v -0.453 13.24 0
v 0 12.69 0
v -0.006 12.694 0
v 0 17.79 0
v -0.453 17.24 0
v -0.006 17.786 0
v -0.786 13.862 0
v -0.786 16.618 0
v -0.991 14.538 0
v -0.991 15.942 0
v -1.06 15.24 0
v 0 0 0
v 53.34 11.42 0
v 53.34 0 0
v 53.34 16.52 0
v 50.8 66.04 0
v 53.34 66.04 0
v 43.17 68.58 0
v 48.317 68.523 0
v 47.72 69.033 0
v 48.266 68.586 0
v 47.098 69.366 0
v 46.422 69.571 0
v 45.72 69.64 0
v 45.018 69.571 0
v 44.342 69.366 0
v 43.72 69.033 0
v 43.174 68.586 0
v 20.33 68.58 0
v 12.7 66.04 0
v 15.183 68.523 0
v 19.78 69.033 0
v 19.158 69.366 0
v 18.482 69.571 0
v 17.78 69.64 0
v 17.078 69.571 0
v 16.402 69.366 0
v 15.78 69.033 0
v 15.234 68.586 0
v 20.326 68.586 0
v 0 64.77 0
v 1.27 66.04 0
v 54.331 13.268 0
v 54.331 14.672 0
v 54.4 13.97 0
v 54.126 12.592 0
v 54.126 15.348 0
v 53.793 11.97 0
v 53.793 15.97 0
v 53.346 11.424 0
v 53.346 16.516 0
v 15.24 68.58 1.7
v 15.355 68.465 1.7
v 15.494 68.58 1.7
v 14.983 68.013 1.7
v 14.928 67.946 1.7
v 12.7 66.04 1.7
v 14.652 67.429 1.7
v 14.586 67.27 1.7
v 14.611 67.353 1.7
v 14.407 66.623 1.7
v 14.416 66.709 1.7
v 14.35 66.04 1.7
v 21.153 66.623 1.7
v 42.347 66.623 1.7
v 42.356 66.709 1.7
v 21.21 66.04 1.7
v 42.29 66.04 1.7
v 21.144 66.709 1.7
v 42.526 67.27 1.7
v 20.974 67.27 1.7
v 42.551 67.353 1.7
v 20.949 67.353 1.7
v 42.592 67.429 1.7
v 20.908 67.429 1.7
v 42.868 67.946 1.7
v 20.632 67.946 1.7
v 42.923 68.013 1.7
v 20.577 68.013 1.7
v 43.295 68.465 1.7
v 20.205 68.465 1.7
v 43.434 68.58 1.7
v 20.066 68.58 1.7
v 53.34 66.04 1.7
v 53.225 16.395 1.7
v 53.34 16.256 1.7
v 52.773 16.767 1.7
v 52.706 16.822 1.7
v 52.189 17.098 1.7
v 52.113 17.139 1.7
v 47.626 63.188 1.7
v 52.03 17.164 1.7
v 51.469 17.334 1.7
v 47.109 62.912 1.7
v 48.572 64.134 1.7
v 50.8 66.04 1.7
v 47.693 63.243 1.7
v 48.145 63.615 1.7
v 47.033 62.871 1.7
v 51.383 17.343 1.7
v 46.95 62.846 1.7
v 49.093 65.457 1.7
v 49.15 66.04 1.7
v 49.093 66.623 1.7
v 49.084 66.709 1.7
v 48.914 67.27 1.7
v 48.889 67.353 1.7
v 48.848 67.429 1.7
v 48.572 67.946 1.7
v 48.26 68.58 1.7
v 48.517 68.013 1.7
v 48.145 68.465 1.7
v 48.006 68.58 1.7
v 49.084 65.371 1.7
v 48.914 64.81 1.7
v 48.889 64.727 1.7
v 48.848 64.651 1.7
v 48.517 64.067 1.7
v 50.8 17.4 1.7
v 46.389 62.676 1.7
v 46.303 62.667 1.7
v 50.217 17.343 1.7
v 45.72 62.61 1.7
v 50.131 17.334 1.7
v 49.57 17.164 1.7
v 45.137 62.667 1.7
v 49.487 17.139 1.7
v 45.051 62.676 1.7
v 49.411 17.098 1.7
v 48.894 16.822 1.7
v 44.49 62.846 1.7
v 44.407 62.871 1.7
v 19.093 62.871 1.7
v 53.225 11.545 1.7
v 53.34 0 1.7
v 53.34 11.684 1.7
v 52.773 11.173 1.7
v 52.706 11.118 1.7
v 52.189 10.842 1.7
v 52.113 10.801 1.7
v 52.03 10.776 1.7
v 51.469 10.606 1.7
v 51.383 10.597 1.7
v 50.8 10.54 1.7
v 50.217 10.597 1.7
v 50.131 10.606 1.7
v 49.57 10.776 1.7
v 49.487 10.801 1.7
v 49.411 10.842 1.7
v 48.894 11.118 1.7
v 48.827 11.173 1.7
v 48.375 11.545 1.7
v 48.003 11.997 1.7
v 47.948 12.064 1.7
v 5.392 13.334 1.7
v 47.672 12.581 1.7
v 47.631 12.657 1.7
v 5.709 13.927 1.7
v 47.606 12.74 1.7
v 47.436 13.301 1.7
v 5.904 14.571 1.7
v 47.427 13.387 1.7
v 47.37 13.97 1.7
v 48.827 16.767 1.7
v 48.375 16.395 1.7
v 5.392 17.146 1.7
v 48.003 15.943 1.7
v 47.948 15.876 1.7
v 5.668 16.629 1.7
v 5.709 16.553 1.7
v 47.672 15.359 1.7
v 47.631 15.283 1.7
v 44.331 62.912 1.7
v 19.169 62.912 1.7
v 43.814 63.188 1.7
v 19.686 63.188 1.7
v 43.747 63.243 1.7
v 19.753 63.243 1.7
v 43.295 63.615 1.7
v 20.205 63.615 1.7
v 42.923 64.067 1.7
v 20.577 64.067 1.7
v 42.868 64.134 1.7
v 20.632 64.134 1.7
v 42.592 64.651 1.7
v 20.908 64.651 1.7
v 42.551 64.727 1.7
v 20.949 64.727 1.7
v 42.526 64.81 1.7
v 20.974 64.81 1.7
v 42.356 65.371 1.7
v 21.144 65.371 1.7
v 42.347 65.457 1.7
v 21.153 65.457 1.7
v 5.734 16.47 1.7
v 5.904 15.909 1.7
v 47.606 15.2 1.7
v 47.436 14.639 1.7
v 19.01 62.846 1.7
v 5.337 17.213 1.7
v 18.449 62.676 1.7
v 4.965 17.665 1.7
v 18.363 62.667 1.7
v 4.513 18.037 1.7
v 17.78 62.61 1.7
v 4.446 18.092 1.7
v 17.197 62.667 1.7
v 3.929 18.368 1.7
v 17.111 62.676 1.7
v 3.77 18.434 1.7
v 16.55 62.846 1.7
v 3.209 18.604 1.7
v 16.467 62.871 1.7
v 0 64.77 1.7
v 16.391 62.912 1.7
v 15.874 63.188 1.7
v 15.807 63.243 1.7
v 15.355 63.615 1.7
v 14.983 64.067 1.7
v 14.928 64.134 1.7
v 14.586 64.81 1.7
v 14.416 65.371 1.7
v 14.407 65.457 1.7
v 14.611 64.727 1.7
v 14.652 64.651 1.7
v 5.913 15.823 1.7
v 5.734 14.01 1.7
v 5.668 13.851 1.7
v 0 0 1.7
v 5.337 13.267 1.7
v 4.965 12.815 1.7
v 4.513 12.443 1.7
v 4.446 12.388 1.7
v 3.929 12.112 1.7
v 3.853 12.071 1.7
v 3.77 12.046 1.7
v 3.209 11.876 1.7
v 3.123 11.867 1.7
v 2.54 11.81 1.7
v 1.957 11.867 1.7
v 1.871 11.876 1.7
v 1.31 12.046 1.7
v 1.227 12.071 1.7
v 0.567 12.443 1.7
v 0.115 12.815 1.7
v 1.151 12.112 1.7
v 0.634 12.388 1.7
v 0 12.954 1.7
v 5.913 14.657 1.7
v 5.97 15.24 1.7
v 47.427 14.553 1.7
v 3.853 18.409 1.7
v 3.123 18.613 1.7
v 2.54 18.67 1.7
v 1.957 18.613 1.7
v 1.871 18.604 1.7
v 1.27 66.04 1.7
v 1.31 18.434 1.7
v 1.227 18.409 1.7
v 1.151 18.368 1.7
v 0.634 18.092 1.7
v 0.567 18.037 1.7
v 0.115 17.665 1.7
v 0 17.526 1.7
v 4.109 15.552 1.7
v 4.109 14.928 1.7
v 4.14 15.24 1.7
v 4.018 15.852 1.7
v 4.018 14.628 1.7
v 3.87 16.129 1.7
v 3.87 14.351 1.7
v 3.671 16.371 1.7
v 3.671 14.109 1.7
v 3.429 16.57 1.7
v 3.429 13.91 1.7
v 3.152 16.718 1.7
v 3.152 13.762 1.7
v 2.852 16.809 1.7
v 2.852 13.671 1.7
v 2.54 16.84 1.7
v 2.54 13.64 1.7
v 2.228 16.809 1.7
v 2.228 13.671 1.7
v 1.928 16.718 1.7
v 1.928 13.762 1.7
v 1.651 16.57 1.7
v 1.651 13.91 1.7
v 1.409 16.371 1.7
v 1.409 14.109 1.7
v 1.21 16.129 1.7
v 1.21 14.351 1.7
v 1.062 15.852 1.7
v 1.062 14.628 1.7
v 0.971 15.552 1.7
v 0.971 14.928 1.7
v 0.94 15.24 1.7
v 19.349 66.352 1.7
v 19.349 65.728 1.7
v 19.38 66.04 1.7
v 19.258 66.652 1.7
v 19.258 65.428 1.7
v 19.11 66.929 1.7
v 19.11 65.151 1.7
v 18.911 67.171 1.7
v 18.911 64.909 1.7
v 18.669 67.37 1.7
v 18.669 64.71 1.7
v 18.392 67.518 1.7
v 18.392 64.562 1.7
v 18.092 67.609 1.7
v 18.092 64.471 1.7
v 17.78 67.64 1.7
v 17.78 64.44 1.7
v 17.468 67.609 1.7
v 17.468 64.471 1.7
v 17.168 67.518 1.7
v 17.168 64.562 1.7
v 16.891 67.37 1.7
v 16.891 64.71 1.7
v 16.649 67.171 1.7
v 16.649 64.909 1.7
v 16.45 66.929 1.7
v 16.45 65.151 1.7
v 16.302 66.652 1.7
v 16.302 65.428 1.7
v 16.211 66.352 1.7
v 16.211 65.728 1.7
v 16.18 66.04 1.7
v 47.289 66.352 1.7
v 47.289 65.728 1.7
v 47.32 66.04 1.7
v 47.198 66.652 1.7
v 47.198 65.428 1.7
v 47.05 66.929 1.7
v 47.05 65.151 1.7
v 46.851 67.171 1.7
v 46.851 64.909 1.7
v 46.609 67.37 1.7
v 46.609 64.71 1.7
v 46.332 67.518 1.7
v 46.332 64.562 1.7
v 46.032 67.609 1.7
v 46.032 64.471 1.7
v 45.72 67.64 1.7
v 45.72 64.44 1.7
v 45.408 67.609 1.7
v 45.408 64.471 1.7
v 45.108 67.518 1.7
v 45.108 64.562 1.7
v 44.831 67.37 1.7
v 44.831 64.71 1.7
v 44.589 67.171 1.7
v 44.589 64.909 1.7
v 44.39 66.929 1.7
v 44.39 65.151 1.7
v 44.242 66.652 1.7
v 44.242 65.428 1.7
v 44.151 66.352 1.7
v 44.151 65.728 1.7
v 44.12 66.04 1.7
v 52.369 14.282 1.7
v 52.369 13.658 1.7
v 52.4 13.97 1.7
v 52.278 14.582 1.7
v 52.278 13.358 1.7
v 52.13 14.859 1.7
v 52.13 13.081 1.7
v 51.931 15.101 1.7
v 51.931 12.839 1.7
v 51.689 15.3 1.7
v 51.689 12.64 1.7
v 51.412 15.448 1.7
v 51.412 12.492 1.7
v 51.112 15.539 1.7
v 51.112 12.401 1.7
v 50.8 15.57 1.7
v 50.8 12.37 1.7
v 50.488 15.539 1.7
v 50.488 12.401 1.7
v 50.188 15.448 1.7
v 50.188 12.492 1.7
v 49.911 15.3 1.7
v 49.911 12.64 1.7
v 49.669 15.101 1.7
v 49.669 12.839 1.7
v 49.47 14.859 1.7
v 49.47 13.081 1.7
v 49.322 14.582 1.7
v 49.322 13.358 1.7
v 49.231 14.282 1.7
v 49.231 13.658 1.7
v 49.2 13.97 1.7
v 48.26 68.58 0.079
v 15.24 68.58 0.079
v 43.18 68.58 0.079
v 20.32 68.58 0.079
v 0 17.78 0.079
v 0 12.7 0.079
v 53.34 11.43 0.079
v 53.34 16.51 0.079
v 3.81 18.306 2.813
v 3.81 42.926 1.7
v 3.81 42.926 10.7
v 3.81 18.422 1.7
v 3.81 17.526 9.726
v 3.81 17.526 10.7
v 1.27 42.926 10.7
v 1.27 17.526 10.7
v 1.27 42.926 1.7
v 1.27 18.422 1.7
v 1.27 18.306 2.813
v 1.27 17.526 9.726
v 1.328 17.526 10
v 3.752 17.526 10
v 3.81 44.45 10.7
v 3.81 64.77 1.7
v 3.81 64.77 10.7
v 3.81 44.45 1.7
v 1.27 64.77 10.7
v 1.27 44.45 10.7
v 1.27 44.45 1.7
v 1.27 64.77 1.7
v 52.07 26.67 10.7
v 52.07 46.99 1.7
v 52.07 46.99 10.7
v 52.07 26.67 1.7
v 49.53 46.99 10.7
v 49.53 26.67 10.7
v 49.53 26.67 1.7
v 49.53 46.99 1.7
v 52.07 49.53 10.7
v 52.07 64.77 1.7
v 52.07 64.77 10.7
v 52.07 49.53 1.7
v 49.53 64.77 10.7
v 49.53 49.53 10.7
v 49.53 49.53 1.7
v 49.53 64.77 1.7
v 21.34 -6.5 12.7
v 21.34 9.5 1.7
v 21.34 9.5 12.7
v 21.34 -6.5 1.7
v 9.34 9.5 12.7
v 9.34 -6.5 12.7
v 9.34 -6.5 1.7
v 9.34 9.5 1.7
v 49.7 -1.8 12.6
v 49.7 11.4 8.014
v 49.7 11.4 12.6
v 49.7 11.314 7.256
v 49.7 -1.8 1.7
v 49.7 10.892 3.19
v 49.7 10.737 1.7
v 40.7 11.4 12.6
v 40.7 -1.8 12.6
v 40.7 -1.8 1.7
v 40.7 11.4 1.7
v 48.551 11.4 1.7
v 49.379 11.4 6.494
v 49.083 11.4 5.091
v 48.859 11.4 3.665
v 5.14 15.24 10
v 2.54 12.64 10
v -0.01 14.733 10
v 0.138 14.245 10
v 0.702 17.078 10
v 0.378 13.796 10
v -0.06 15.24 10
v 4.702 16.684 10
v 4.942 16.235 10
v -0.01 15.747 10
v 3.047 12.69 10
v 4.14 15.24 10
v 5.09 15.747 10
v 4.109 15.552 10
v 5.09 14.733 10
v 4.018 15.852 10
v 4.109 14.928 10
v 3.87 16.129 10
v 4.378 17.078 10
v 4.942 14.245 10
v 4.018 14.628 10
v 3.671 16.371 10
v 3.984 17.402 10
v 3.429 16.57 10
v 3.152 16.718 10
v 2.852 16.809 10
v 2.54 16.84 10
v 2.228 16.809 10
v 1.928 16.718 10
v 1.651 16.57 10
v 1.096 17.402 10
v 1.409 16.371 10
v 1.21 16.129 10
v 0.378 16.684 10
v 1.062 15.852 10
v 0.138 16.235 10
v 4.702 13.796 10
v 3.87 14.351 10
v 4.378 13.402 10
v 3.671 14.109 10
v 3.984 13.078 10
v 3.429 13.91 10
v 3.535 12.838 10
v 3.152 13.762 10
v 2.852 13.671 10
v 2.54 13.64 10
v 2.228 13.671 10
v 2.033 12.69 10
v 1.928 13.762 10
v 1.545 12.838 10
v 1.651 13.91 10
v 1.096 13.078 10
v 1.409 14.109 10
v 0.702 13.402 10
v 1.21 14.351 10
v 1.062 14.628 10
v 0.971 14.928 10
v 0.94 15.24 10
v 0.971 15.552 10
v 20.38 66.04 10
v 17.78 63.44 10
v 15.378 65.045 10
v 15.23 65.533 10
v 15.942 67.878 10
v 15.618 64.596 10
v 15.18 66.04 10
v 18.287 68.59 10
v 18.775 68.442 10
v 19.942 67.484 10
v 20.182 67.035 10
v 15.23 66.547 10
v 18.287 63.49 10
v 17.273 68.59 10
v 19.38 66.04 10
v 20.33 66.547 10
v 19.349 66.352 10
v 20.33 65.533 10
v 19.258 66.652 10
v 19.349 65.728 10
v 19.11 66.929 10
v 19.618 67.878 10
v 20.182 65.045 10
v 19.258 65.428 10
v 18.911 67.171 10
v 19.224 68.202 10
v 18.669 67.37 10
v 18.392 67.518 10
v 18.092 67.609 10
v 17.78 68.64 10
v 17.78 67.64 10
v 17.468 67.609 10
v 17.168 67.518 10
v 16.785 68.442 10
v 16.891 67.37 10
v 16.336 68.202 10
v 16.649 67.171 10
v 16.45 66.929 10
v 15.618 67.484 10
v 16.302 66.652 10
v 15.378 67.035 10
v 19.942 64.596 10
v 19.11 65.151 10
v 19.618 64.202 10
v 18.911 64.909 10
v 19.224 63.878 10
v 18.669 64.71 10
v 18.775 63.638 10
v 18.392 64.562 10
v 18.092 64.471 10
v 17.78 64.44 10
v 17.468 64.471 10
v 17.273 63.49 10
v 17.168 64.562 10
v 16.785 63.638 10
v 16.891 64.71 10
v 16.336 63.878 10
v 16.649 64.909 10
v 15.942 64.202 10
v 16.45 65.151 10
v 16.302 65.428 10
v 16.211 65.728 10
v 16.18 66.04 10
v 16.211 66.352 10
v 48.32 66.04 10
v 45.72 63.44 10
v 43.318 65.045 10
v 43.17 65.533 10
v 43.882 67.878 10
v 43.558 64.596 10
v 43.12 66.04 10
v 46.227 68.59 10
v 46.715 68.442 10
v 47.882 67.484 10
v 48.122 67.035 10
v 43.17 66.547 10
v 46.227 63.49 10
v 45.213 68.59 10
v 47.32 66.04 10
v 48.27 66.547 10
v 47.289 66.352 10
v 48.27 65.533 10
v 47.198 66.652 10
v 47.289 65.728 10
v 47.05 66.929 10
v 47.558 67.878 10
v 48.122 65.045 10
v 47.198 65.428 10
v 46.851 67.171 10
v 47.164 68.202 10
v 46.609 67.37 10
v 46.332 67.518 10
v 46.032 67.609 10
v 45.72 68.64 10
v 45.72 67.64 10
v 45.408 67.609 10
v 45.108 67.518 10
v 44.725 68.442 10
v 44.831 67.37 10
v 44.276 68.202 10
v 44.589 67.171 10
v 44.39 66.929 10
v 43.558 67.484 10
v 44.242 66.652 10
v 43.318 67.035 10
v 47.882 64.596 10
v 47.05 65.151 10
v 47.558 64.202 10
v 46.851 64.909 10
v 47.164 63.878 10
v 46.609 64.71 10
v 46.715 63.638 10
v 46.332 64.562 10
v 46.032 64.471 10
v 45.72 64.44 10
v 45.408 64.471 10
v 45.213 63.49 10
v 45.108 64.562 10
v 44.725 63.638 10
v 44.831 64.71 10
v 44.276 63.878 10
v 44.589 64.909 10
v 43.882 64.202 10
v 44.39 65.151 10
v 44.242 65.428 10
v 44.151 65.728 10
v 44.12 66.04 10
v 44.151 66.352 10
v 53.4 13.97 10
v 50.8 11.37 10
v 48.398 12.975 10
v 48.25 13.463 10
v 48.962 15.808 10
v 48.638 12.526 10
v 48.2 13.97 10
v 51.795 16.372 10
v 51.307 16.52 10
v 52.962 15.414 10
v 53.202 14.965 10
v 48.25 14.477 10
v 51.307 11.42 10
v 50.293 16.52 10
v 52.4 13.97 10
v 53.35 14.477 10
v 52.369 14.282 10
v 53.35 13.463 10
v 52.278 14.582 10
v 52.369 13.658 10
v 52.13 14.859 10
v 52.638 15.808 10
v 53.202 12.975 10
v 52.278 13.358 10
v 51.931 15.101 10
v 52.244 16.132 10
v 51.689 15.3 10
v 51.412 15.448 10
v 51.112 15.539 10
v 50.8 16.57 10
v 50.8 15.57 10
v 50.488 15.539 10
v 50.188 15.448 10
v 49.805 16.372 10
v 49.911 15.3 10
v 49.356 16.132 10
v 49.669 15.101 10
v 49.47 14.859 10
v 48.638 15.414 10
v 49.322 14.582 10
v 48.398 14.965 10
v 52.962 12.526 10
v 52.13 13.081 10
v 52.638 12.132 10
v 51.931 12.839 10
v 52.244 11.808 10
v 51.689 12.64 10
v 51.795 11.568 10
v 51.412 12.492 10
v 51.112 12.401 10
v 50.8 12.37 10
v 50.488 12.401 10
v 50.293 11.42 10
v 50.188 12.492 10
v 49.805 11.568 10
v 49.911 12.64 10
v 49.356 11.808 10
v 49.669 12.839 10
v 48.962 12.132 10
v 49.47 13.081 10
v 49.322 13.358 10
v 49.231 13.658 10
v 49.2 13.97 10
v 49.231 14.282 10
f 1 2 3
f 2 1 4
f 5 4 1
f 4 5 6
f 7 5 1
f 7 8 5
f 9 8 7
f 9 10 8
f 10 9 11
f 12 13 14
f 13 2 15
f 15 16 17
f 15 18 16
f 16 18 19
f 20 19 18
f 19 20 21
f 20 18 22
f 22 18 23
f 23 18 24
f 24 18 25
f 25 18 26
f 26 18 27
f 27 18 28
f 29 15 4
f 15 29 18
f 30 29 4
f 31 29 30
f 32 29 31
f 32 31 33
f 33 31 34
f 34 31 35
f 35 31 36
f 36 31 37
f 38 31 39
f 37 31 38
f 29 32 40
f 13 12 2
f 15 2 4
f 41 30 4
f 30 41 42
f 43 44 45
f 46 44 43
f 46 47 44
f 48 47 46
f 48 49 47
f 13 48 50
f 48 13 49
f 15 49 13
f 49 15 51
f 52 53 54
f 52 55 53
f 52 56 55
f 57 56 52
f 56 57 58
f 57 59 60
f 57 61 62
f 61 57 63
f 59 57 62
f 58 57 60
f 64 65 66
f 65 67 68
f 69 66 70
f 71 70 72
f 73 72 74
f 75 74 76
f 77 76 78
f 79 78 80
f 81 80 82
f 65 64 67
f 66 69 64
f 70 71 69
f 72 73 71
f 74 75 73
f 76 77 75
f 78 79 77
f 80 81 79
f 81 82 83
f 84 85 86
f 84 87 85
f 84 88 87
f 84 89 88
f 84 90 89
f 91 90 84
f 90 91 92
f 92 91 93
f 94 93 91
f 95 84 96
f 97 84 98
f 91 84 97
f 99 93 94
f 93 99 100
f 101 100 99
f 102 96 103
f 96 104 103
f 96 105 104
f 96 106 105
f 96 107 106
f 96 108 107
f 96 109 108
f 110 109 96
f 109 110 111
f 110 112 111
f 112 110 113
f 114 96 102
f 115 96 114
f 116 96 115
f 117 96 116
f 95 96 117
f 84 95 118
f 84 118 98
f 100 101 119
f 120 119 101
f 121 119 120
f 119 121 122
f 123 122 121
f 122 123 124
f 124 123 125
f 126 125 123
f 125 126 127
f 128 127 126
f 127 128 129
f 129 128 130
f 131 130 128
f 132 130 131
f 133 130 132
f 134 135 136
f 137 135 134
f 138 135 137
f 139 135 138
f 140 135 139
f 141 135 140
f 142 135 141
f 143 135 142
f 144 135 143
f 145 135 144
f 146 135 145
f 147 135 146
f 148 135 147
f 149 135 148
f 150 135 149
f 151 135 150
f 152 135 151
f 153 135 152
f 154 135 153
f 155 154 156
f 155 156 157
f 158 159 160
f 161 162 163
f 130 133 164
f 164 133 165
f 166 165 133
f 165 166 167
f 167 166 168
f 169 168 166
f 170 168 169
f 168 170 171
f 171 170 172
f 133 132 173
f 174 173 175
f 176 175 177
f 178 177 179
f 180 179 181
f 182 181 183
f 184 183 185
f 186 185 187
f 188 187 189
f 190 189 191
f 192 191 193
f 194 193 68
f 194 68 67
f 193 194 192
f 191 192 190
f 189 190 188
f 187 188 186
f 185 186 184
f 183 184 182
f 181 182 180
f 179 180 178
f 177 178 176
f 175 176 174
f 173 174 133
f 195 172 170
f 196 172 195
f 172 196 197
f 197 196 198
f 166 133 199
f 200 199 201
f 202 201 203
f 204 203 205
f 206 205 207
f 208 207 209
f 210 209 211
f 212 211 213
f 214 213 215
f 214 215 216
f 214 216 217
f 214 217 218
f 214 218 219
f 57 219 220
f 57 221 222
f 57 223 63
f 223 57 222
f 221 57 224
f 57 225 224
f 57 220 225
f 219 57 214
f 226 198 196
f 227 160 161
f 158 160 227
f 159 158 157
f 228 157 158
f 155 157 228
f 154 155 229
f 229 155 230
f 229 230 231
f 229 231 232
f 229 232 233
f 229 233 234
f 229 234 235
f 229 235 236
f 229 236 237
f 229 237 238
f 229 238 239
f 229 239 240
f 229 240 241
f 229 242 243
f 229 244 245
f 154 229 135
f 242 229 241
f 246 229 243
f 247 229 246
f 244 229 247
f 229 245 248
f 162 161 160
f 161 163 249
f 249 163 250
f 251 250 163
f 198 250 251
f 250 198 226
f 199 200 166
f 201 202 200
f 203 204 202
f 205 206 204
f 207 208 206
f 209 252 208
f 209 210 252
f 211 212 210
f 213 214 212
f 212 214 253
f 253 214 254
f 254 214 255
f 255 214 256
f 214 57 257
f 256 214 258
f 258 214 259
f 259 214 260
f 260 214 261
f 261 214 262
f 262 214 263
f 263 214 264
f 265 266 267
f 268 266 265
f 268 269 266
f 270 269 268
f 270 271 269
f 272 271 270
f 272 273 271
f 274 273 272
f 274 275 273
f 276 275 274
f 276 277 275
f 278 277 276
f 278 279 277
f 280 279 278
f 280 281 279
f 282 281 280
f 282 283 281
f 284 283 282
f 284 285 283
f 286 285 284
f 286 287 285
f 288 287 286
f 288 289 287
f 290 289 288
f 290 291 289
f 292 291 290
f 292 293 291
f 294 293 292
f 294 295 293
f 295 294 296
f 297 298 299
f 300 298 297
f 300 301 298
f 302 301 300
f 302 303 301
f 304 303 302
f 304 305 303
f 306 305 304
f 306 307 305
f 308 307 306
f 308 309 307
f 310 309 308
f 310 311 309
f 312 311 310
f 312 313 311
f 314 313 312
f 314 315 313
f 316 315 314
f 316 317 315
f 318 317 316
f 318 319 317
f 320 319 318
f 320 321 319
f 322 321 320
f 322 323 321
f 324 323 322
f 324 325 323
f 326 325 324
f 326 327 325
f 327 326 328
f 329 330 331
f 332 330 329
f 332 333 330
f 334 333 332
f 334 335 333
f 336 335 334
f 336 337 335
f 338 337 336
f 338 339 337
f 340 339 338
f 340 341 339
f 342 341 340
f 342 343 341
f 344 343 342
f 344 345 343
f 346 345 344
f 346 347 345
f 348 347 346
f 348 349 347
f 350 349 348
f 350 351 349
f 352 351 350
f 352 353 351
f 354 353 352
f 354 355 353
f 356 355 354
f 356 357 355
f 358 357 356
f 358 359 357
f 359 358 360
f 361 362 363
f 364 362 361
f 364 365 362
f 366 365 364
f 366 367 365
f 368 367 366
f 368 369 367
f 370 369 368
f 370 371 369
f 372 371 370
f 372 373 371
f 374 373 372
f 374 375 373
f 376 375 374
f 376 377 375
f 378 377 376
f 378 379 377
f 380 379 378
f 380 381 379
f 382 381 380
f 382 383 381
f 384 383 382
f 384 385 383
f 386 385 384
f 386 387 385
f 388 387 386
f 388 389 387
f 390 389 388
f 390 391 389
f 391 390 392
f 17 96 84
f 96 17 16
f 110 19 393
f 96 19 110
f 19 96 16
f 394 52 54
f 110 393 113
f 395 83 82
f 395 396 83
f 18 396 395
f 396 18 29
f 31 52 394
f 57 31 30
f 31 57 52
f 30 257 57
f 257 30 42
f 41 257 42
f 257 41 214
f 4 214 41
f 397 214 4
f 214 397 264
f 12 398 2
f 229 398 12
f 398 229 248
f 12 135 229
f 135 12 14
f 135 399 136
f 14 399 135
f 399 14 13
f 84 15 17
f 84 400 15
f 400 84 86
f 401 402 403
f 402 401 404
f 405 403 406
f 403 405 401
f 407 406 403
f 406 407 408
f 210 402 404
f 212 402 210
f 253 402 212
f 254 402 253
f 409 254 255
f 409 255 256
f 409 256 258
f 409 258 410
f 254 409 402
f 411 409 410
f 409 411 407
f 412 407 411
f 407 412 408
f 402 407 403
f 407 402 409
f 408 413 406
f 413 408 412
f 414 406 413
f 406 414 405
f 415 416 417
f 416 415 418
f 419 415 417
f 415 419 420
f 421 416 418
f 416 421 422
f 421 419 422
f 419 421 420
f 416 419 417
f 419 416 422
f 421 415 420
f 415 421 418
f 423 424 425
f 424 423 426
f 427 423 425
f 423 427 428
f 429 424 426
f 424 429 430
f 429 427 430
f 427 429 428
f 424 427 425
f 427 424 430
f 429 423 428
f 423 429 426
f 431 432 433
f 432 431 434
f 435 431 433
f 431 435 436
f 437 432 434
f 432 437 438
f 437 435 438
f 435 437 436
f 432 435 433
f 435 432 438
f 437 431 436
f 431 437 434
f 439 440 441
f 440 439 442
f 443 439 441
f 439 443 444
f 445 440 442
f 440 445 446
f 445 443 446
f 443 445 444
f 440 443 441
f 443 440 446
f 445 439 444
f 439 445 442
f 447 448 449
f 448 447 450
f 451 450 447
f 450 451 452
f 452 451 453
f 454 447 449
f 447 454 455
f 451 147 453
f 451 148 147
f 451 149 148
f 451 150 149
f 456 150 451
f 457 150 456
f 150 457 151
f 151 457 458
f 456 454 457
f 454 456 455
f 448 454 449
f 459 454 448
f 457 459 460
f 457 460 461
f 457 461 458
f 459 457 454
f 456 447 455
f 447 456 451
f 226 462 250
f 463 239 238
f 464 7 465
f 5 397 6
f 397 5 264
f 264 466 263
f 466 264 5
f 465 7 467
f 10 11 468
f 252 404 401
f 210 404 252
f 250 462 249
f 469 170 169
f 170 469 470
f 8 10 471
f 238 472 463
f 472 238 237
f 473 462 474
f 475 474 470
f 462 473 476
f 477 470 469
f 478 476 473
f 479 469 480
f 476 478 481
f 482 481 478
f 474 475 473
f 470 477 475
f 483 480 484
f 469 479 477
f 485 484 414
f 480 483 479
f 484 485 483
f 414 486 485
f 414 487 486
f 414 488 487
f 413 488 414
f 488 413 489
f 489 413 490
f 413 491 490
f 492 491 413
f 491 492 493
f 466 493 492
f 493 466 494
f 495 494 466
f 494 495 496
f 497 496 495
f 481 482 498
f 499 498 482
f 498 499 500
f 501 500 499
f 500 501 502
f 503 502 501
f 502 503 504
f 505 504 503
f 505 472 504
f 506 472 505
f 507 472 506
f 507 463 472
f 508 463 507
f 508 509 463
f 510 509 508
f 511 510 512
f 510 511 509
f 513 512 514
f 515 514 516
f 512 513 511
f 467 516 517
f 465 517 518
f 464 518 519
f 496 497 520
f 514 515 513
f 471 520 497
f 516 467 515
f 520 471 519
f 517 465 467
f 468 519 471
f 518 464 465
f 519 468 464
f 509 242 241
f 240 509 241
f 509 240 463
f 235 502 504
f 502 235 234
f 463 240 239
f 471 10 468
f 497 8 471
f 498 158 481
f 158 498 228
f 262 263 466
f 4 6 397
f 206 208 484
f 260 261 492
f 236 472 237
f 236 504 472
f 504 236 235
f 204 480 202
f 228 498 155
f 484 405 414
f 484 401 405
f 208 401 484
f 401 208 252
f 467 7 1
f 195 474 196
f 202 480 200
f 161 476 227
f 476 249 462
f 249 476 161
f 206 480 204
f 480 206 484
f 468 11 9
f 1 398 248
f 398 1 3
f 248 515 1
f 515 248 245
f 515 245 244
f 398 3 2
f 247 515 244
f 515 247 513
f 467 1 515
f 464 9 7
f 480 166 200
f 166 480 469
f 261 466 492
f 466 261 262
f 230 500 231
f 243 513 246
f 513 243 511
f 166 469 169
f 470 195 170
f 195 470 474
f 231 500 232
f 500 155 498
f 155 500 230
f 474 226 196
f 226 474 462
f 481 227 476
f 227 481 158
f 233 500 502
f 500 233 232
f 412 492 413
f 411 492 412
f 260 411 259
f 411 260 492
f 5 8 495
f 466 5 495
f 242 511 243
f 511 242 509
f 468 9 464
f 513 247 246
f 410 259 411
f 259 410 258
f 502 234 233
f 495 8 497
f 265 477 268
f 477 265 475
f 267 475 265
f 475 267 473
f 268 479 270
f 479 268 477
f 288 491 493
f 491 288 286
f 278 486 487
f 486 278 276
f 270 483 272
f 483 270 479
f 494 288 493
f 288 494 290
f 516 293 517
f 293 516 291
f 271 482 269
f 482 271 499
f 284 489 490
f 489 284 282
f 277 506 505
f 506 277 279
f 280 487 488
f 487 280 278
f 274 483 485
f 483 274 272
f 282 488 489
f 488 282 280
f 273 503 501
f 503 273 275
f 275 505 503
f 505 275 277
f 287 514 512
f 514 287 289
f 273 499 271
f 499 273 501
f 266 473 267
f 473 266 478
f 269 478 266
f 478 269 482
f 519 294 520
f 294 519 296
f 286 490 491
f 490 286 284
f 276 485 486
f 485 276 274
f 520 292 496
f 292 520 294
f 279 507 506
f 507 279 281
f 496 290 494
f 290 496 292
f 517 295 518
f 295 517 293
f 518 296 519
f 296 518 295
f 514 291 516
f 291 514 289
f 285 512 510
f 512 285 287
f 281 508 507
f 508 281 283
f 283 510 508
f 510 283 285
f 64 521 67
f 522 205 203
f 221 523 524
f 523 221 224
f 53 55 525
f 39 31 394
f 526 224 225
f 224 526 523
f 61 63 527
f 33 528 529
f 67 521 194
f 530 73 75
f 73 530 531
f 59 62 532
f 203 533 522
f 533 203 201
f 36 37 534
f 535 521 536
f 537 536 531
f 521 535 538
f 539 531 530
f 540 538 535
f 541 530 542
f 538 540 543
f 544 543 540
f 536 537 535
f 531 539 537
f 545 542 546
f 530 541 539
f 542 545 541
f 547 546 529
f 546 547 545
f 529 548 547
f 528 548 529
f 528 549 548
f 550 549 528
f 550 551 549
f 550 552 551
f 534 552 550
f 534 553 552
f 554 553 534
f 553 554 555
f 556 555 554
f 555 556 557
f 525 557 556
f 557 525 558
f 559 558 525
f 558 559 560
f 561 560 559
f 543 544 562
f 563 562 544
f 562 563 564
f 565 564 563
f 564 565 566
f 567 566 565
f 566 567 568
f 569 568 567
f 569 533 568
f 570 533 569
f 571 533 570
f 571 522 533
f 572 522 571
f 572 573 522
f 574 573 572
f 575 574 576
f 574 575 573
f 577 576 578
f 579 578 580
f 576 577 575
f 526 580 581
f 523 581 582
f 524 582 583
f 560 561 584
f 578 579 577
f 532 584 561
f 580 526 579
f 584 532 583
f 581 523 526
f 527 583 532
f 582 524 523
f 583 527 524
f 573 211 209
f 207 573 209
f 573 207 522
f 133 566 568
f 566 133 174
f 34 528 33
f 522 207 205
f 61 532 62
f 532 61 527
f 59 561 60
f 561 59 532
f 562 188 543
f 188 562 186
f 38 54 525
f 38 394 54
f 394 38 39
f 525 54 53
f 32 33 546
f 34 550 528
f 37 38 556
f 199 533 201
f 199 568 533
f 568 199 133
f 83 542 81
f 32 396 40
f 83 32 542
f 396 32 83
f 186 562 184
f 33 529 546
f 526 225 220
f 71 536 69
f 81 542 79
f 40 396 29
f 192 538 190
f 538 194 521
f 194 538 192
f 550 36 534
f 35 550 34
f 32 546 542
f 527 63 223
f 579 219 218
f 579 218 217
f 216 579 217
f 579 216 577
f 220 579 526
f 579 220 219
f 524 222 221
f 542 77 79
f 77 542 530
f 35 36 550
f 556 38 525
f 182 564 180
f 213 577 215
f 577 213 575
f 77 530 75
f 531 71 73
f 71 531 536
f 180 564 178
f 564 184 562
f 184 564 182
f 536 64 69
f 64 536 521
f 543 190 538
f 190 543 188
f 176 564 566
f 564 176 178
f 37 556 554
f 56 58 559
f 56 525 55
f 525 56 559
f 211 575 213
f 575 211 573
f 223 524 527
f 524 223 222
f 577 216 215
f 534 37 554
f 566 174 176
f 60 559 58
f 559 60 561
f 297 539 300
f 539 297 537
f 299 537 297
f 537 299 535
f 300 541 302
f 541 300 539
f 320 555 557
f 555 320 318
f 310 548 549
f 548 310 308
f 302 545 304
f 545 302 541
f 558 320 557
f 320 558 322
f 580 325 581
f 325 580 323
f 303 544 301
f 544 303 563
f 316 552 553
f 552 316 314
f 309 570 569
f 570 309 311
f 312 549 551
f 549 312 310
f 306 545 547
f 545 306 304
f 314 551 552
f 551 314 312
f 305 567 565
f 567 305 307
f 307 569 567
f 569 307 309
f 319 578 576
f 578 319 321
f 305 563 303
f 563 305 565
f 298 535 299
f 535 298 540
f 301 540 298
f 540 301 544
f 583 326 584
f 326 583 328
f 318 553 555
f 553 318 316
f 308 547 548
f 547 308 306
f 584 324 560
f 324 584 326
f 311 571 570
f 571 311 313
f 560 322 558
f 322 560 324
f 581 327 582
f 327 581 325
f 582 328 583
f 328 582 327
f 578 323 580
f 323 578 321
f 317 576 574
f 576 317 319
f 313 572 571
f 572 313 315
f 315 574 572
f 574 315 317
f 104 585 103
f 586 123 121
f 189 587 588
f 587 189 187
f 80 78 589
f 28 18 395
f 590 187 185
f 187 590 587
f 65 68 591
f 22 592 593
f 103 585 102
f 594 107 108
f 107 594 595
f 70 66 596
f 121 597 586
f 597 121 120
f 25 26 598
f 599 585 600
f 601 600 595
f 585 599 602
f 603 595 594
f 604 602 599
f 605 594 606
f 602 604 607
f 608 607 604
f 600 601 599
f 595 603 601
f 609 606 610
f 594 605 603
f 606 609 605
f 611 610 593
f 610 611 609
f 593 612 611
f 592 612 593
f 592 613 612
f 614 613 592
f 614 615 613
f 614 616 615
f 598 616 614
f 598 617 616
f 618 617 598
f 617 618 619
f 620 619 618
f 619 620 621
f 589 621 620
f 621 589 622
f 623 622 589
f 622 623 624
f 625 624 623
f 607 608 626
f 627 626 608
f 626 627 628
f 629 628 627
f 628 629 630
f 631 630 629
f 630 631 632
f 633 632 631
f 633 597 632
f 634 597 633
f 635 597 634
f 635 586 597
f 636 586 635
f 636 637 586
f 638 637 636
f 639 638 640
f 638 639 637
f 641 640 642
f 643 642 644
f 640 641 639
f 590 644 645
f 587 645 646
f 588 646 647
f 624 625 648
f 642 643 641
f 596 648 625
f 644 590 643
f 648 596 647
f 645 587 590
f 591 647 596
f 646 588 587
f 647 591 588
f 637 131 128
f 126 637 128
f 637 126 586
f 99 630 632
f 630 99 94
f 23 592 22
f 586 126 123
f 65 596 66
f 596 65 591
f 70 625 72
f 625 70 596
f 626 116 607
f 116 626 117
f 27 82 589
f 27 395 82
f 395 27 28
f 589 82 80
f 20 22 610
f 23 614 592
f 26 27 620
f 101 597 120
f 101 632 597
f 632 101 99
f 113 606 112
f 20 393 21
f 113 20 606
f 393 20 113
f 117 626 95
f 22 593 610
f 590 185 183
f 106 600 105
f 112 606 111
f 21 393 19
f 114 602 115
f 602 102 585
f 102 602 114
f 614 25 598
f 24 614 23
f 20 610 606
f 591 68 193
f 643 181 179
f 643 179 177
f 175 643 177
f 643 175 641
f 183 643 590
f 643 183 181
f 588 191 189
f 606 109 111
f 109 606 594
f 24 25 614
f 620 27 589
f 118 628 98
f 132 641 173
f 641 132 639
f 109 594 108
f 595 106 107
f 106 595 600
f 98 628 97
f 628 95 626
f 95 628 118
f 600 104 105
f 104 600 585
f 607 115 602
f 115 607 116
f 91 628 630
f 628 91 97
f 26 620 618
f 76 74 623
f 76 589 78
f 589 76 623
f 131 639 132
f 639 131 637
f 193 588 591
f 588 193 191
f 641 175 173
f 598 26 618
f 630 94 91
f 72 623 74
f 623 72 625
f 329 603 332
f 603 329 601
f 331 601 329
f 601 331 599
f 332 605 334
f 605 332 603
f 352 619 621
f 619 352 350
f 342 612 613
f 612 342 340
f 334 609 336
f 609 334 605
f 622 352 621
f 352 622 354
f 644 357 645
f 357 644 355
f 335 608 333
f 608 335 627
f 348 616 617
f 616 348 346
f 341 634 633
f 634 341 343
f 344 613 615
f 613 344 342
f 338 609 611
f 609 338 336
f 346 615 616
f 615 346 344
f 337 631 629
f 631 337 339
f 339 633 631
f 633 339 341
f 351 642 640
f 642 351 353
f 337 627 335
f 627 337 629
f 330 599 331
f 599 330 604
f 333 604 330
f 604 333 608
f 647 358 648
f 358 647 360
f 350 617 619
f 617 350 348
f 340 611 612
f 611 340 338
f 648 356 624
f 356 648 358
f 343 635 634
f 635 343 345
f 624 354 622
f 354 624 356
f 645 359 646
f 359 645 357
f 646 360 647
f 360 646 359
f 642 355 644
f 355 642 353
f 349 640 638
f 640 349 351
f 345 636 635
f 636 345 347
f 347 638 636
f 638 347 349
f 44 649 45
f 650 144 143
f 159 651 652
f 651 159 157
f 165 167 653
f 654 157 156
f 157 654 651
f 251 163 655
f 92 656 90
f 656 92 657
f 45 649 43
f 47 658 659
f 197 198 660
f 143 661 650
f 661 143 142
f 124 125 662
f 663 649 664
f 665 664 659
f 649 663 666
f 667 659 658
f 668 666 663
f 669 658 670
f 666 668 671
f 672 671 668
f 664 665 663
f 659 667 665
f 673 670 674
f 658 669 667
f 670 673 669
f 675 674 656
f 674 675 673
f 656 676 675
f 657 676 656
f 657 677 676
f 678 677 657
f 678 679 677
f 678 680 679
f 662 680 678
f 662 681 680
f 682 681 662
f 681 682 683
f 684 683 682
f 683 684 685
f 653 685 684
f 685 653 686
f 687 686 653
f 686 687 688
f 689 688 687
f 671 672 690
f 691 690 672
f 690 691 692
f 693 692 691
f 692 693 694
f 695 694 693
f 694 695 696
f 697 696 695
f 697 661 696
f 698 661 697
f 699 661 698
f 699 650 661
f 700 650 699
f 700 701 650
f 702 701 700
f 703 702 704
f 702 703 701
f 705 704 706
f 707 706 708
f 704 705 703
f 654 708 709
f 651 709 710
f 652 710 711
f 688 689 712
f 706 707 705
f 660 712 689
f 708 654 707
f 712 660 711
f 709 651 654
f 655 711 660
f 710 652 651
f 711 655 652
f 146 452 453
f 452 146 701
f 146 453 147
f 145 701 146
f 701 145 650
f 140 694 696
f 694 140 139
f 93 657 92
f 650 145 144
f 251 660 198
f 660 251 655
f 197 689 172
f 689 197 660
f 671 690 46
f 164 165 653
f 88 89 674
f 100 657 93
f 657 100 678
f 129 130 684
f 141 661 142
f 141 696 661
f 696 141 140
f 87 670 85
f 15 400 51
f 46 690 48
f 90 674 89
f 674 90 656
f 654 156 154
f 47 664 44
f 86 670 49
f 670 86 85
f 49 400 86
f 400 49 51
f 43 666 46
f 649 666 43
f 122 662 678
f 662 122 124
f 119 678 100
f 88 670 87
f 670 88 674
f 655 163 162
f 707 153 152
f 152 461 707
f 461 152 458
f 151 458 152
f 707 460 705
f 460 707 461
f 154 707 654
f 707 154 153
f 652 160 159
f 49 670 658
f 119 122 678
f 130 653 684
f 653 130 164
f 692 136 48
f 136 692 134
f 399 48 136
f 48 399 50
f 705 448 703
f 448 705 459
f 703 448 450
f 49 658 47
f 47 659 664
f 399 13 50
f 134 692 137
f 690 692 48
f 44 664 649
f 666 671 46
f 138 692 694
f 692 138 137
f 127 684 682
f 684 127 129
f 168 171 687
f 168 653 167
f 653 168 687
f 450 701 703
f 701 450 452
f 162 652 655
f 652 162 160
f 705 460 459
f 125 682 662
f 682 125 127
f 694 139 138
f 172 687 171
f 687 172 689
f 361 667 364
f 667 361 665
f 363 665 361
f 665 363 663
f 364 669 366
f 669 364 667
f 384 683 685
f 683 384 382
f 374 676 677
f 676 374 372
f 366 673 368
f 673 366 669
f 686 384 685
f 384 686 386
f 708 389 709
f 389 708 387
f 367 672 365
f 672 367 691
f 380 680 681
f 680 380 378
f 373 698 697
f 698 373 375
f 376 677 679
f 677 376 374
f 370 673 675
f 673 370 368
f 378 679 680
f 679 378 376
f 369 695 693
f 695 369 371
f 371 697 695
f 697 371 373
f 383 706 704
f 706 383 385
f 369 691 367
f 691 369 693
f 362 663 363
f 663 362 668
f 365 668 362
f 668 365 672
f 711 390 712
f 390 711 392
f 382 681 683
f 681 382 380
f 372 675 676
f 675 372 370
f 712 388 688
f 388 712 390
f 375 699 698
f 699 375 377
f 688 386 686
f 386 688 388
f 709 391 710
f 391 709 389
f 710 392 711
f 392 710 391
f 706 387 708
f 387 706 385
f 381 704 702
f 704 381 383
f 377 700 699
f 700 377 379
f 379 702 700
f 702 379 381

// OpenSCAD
// Arduino connectors library
//
// Copyright (c) 2013 Kelly Egan
//
// The MIT License (MIT)
//
// Permission is hereby granted, free of charge, to any person obtaining a copy of this software 
// and associated documentation files (the "Software"), to deal in the Software without restriction, 
// including without limitation the rights to use, copy, modify, merge, publish, distribute, sublicense,
// and/or sell copies of the Software, and to permit persons to whom the Software is furnished to do 
// so, subject to the following conditions:
//
// The above copyright notice and this permission notice shall be included in all copies or substantial
// portions of the Software.
//
// THE SOFTWARE IS PROVIDED "AS IS", WITHOUT WARRANTY OF ANY KIND, EXPRESS OR IMPLIED, INCLUDING BUT 
// NOT LIMITED TO THE WARRANTIES OF MERCHANTABILITY, FITNESS FOR A PARTICULAR PURPOSE AND NONINFRINGEMENT. 
// IN NO EVENT SHALL THE AUTHORS OR COPYRIGHT HOLDERS BE LIABLE FOR ANY CLAIM, DAMAGES OR OTHER LIABILITY,
// WHETHER IN AN ACTION OF CONTRACT, TORT OR OTHERWISE, ARISING FROM, OUT OF OR IN CONNECTION WITH THE 
// SOFTWARE OR THE USE OR OTHER DEALINGS IN THE SOFTWARE.
//

//use <pin_connectors/pins.scad>

//Constructs a roughed out arduino board
//Current only USB, power and headers
module arduino(boardType = UNO) {
  //The PCB with holes
  difference() {
    color("SteelBlue") 
      boardShape( boardType );
    translate([0,0,-pcbHeight * 0.5]) holePlacement(boardType = boardType)
      color("SteelBlue") cylinder(r = mountingHoleRadius, h = pcbHeight * 2, $fn=32);
  }
  //Add all components to board
  components( boardType = boardType, component = ALL );
}
arduino();
//Creates a bumper style enclosure that fits tightly around the edge of the PCB.
module bumper( boardType = UNO, mountingHoles = false ) {
  bumperBaseHeight = 2;
  bumperHeight = bumperBaseHeight + pcbHeight + 0.5;
  dimensions = boardDimensions(boardType);

  difference() {
    union() {
      //Outer rim of bumper
      difference() {
        boardShape(boardType = boardType, offset=1.4, height = bumperHeight);
        translate([0,0,-0.1])
          boardShape(boardType = boardType, height = bumperHeight + 0.2);
      }

      //Base of bumper  
      difference() {
        boardShape(boardType = boardType, offset=1, height = bumperBaseHeight);
        translate([0,0, -0.1])
          boardShape(boardType = boardType, offset=-2, height = bumperHeight + 0.2);
      }

      //Board mounting holes
      holePlacement(boardType=boardType)
        cylinder(r = mountingHoleRadius + 1.5, h = bumperBaseHeight, $fn = 32);

      //Bumper mounting holes (exterior)
      if( mountingHoles ) {
        difference() {  
          hull() {
            translate([-6, (dimensions[1] - 6) / 2, 0])
              cylinder( r = 6, h = pcbHeight + 2, $fn = 32 );
            translate([ -0.5, dimensions[1] / 2 - 9, 0])
              cube([0.5, 12, bumperHeight]);
          }
          translate([-6, (dimensions[1] - 6) / 2, 0])
            mountingHole(holeDepth = bumperHeight);
        }
        difference() {  
          hull() {
            translate([dimensions[0] + 6, (dimensions[1] - 6) / 2,0])
              cylinder( r = 6, h = pcbHeight + 2, $fn = 32 );
            translate([ dimensions[0], dimensions[1] / 2 - 9, 0]) 
              cube([0.5, 12, bumperHeight]);
          }
          translate([dimensions[0] + 6, (dimensions[1] - 6) / 2,0])
            mountingHole(holeDepth = bumperHeight);
        }
      }
    }
    translate([0,0,-0.5])
    holePlacement(boardType=boardType)
      cylinder(r = mountingHoleRadius, h = bumperHeight, $fn = 32);  
    translate([0, 0, bumperBaseHeight]) {
      components(boardType = boardType, component = ALL, offset = 1);
    }
    translate([4,(dimensions[1] - dimensions[1] * 0.4)/2,-1])
      cube([dimensions[0] -8,dimensions[1] * 0.4,bumperBaseHeight + 2]);
  }
}

//Setting for enclosure mounting holes (Not Arduino mounting)
NOMOUNTINGHOLES = 0;
INTERIORMOUNTINGHOLES = 1;
EXTERIORMOUNTINGHOLES = 2;

//Create a board enclosure
module enclosure(boardType = UNO, wall = 3, offset = 3, heightExtension = 10, cornerRadius = 3, mountType = TAPHOLE) {
  standOffHeight = 5;

  dimensions = boardDimensions(boardType);
  boardDim = boardDimensions(boardType);
  pcbDim = pcbDimensions(boardType);

  enclosureWidth = pcbDim[0] + (wall + offset) * 2;
  enclosureDepth = pcbDim[1] + (wall + offset) * 2;
  enclosureHeight = boardDim[2] + wall + standOffHeight + heightExtension;

  union() {
    difference() {
      //Main box shape
      boundingBox(boardType = boardType, height = enclosureHeight, offset = wall + offset, include=PCB, cornerRadius = wall);
  
      translate([ 0, 0, wall]) {
        //Interior of box
        boundingBox(boardType = boardType, height = enclosureHeight, offset = offset, include=PCB, cornerRadius = wall);
  
        //Punch outs for USB and POWER
        translate([0, 0, standOffHeight]) {
          components(boardType = boardType, offset = 1, extension = wall + offset + 10);
        }
      }
      
      //Holes for lid clips
      translate([0, enclosureDepth * 0.75 - (offset + wall), enclosureHeight]) {
        translate([-offset, 0, 0])
          rotate([0, 180, 90]) clipHole(clipHeight = 10, holeDepth = wall + 0.2);
        translate([offset + boardDim[0], 0, 0])
          rotate([0, 180, 270]) clipHole(clipHeight = 10, holeDepth = wall + 0.2);
      }
    
      translate([0, enclosureDepth * 0.25 - (offset + wall), enclosureHeight]) {
        translate([-offset, 0, 0])
          rotate([0, 180, 90]) clipHole(clipHeight = 10, holeDepth = wall + 0.2);
        translate([offset + dimensions[0], 0, 0])
          rotate([0, 180, 270]) clipHole(clipHeight = 10, holeDepth = wall + 0.2);
      }   
    }
    translate([0, 0, wall]) {
      standoffs(boardType = boardType, height = standOffHeight, mountType = mountType);
    }
  }
}

//Create a snap on lid for enclosure
module enclosureLid( boardType = UNO, wall = 3, offset = 3, cornerRadius = 3, ventHoles = false) {
  dimensions = boardDimensions(boardType);
  boardDim = boardDimensions(boardType);
  pcbDim = pcbDimensions(boardType);

  enclosureWidth = pcbDim[0] + (wall + offset) * 2;
  enclosureDepth = pcbDim[1] + (wall + offset) * 2;

  difference() {
    union() {
      boundingBox(boardType = boardType, height = wall, offset = wall + offset, include=PCB, cornerRadius = wall);

      translate([0, 0, -wall * 0.5])
        boundingBox(boardType = boardType, height = wall * 0.5, offset = offset - 0.5, include=PCB, cornerRadius = wall);
    
      //Lid clips
      translate([0, enclosureDepth * 0.75 - (offset + wall), 0]) {
        translate([-offset, 0, 0])
          rotate([0, 180, 90]) clip(clipHeight = 10);
        translate([offset + boardDim[0], 0, 0])
          rotate([0, 180, 270]) clip(clipHeight = 10);
      }
    
      translate([0, enclosureDepth * 0.25 - (offset + wall), 0]) {
        translate([-offset, 0, 0])
          rotate([0, 180, 90]) clip(clipHeight = 10);
        translate([offset + dimensions[0], 0, 0])
          rotate([0, 180, 270]) clip(clipHeight = 10);
      }

    }
  }
}

//Offset from board. Negative values are insets
module boardShape( boardType = UNO, offset = 0, height = pcbHeight ) {
  dimensions = boardDimensions(boardType);

  xScale = (dimensions[0] + offset * 2) / dimensions[0];
  yScale = (dimensions[1] + offset * 2) / dimensions[1];

  translate([-offset, -offset, 0])
    scale([xScale, yScale, 1.0])
      linear_extrude(height = height) 
        polygon(points = boardShapes[boardType]);
}
boardShape();

//Create a bounding box around the board
//Offset - will increase the size of the box on each side,
//Height - overides the boardHeight and offset in the z direction

BOARD = 0;        //Includes all components and PCB
PCB = 1;          //Just the PCB
COMPONENTS = 2;   //Just the components

module boundingBox(boardType = UNO, offset = 0, height = 0, cornerRadius = 0, include = BOARD) {
  //What parts are included? Entire board, pcb or just components.
  pos = ([boardPosition(boardType), pcbPosition(boardType), componentsPosition(boardType)])[include];
  dim = ([boardDimensions(boardType), pcbDimensions(boardType), componentsDimensions(boardType)])[include];

  //Depending on if height is set position and dimensions will change
  position = [
        pos[0] - offset, 
        pos[1] - offset, 
        (height == 0 ? pos[2] - offset : pos[2] )
        ];

  dimensions = [
        dim[0] + offset * 2, 
        dim[1] + offset * 2, 
        (height == 0 ? dim[2] + offset * 2 : height)
        ];

  translate( position ) {
    if( cornerRadius == 0 ) {
      cube( dimensions );
    } else {
      roundedCube( dimensions, cornerRadius=cornerRadius );
    }
  }
}

//Creates standoffs for different boards
TAPHOLE = 0;
PIN = 1;

module standoffs( 
  boardType = UNO, 
  height = 10, 
  topRadius = mountingHoleRadius + 1, 
  bottomRadius =  mountingHoleRadius + 2, 
  holeRadius = mountingHoleRadius,
  mountType = TAPHOLE
  ) {

  holePlacement(boardType = boardType)
    union() {
      difference() {
        cylinder(r1 = bottomRadius, r2 = topRadius, h = height, $fn=32);
        if( mountType == TAPHOLE ) {
          cylinder(r =  holeRadius, h = height * 4, center = true, $fn=32);
        }
      }
      if( mountType == PIN ) {
        translate([0, 0, height - 1])
        pintack( h=pcbHeight + 3, r = holeRadius, lh=3, lt=1, bh=1, br=topRadius );
      }
    }  
}
standoffs();


//This is used for placing the mounting holes and for making standoffs
//child elements will be centered on that chosen boards mounting hole centers
module holePlacement(boardType = UNO ) {
  for(i = boardHoles[boardType] ) {
    translate(i)
      children(0);
  }
}

//Places components on board
//  compenent - the data set with a particular component (like boardHeaders)
//  extend - the amount to extend the component in the direction of its socket
//  offset - the amount to increase the components other two boundaries

//Component IDs
ALL = -1;
HEADER_F = 0;
HEADER_M = 1;
USB = 2;
POWER = 3;
RJ45 = 4;

module components( boardType = UNO, component = ALL, extension = 0, offset = 0 ) {
  translate([0, 0, pcbHeight]) {
    for( i = [0:len(components[boardType]) - 1] ){
      if( components[boardType][i][3] == component || component == ALL) {
          //Calculates position + adjustment for offset and extention  
          position = components[boardType][i][0] 
            - (([1,1,1] - components[boardType][i][2]) * offset)
            + [  min(components[boardType][i][2][0],0), min(components[boardType][i][2][1],0), min(components[boardType][i][2][2],0) ] 
            * extension;
          //Calculates the full box size including offset and extention
          dimensions = components[boardType][i][1] 
            + ((components[boardType][i][2] * [1,1,1]) 
              * components[boardType][i][2]) * extension
            + ([1,1,1] - components[boardType][i][2]) * offset * 2;        
          translate( position ) color( components[boardType][i][4] ) 
            cube( dimensions );
      }
    }  
  }
}

module roundedCube( dimensions = [10,10,10], cornerRadius = 1, faces=32 ) {
  hull() cornerCylinders( dimensions = dimensions, cornerRadius = cornerRadius, faces=faces ); 
}

module cornerCylinders( dimensions = [10,10,10], cornerRadius = 1, faces=32 ) {
  translate([ cornerRadius, cornerRadius, 0]) {
    cylinder( r = cornerRadius, $fn = faces, h = dimensions[2] );
    translate([dimensions[0] - cornerRadius * 2, 0, 0]) cylinder( r = cornerRadius, $fn = faces, h = dimensions[2] );
    translate([0, dimensions[1] - cornerRadius * 2, 0]) {
      cylinder( r = cornerRadius, $fn = faces, h = dimensions[2] );
      translate([dimensions[0] - cornerRadius * 2, 0, 0]) cylinder( r = cornerRadius, $fn = faces, h = dimensions[2] );
    }
  }
}

//Create a clip that snapps into a clipHole
module clip(clipWidth = 5, clipDepth = 5, clipHeight = 5, lipDepth = 1.5, lipHeight = 3) {
  translate([-clipWidth/2,-(clipDepth-lipDepth),0]) rotate([90, 0, 90])
  linear_extrude(height = clipWidth, convexity = 10)
    polygon(  points=[  [0, 0], 
            [clipDepth - lipDepth, 0],
            [clipDepth - lipDepth, clipHeight - lipHeight],
            [clipDepth - 0.25, clipHeight - lipHeight],
            [clipDepth, clipHeight - lipHeight + 0.25],
            [clipDepth - lipDepth * 0.8, clipHeight],
            [(clipDepth - lipDepth) * 0.3, clipHeight] 
            ], 
        paths=[[0,1,2,3,4,5,6,7]]
      );
}

//Hole for clip
module clipHole(clipWidth = 5, clipDepth = 5, clipHeight = 5, lipDepth = 1.5, lipHeight = 3, holeDepth = 5) {
  offset = 0.1;
  translate([-clipWidth/2,-(clipDepth-lipDepth),0])
  translate([-offset, clipDepth - lipDepth-offset, clipHeight - lipHeight - offset])
    cube( [clipWidth + offset * 2, holeDepth, lipHeight + offset * 2] );
}

module mountingHole(screwHeadRad = woodscrewHeadRad, screwThreadRad = woodscrewThreadRad, screwHeadHeight = woodscrewHeadHeight, holeDepth = 10) {
  union() {
    translate([0, 0, -0.01])
      cylinder( r = screwThreadRad, h = 1.02, $fn = 32 );
    translate([0, 0, 1])
      cylinder( r1 = screwThreadRad, r2 = screwHeadRad, h = screwHeadHeight, $fn = 32 );
    translate([0, 0, screwHeadHeight - 0.01 + 1])
      cylinder( r = screwHeadRad, h = holeDepth - screwHeadHeight + 0.02, $fn = 32 );
  }
}

/******************************** UTILITY FUNCTIONS *******************************/

//Return the length side of a square given its diagonal
function sides( diagonal ) = sqrt(diagonal * diagonal  / 2);

//Return the minimum values between two vectors of either length 2 or 3. 2D Vectors are treated as 3D vectors who final value is 0.
function minVec( vector1, vector2 ) =
  [min(vector1[0], vector2[0]), min(vector1[1], vector2[1]), min((vector1[2] == undef ? 0 : vector1[2]), (vector2[2] == undef ? 0 : vector2[2]) )];

//Return the maximum values between two vectors of either length 2 or 3. 2D Vectors are treated as 3D vectors who final value is 0.
function maxVec( vector1, vector2 ) =
  [max(vector1[0], vector2[0]), max(vector1[1], vector2[1]), max((vector1[2] == undef ? 0 : vector1[2]), (vector2[2] == undef ? 0 : vector2[2]) )];

//Determine the minimum point on a component in a list of components
function minCompPoint( list, index = 0, minimum = [10000000, 10000000, 10000000] ) = 
  index >= len(list) ? minimum : minCompPoint( list, index + 1, minVec( minimum, list[index][0] ));

//Determine the maximum point on a component in a list of components
function maxCompPoint( list, index = 0, maximum = [-10000000, -10000000, -10000000] ) = 
  index >= len(list) ? maximum : maxCompPoint( list, index + 1, maxVec( maximum, list[index][0] + list[index][1]));

//Determine the minimum point in a list of points
function minPoint( list, index = 0, minimum = [10000000, 10000000, 10000000] ) = 
  index >= len(list) ? minimum : minPoint( list, index + 1, minVec( minimum, list[index] ));

//Determine the maximum point in a list of points
function maxPoint( list, index = 0, maximum = [-10000000, -10000000, -10000000] ) = 
  index >= len(list) ? maximum : maxPoint( list, index + 1, maxVec( maximum, list[index] ));

//Returns the pcb position and dimensions
function pcbPosition(boardType = UNO) = minPoint(boardShapes[boardType]);
function pcbDimensions(boardType = UNO) = maxPoint(boardShapes[boardType]) - minPoint(boardShapes[boardType]) + [0, 0, pcbHeight];

//Returns the position of the box containing all components and its dimensions
function componentsPosition(boardType = UNO) = minCompPoint(components[boardType]) + [0, 0, pcbHeight];
function componentsDimensions(boardType = UNO) = maxCompPoint(components[boardType]) - minCompPoint(components[boardType]);

//Returns the position and dimensions of the box containing the pcb board
function boardPosition(boardType = UNO) = 
  minCompPoint([[pcbPosition(boardType), pcbDimensions(boardType)], [componentsPosition(boardType), componentsDimensions(boardType)]]);
function boardDimensions(boardType = UNO) = 
  maxCompPoint([[pcbPosition(boardType), pcbDimensions(boardType)], [componentsPosition(boardType), componentsDimensions(boardType)]]) 
  - minCompPoint([[pcbPosition(boardType), pcbDimensions(boardType)], [componentsPosition(boardType), componentsDimensions(boardType)]]);

/******************************* BOARD SPECIFIC DATA ******************************/
//Board IDs
NG = 0;
DIECIMILA = 1;
DUEMILANOVE = 2;
UNO = 3;
LEONARDO = 4;
MEGA = 5;
MEGA2560 = 6;
DUE = 7;
YUN = 8; 
INTELGALILEO = 9;
TRE = 10;
ETHERNET = 11;

/********************************** MEASUREMENTS **********************************/
pcbHeight = 1.7;
headerWidth = 2.54;
headerHeight = 9;
mountingHoleRadius = 3.2 / 2;

ngWidth = 53.34;
leonardoDepth = 68.58 + 1.1;           //PCB depth plus offset of USB jack (1.1)
ngDepth = 68.58 + 6.5;
megaDepth = 101.6 + 6.5;               //Coding is my business and business is good!
dueDepth = 101.6 + 1.1;

arduinoHeight = 11 + pcbHeight + 0;

/********************************* MOUNTING HOLES *********************************/

//Duemilanove, Diecimila, NG and earlier
ngHoles = [
  [  2.54, 15.24 ],
  [  17.78, 66.04 ],
  [  45.72, 66.04 ]
  ];

//Uno, Leonardo holes
unoHoles = [
  [  2.54, 15.24 ],
  [  17.78, 66.04 ],
  [  45.72, 66.04 ],
  [  50.8, 13.97 ]
  ];

//Due and Mega 2560
dueHoles = [
  [  2.54, 15.24 ],
  [  17.78, 66.04 ],
  [  45.72, 66.04 ],
  [  50.8, 13.97 ],
  [  2.54, 90.17 ],
  [  50.8, 96.52 ]
  ];

// Original Mega holes
megaHoles = [
  [  2.54, 15.24 ],
  [  50.8, 13.97 ],
  [  2.54, 90.17 ],
  [  50.8, 96.52 ]
  ];

boardHoles = [ 
  ngHoles,        //NG
  ngHoles,        //Diecimila
  ngHoles,        //Duemilanove
  unoHoles,       //Uno
  unoHoles,       //Leonardo
  megaHoles,      //Mega
  dueHoles,       //Mega 2560
  dueHoles,       //Due
  0,              //Yun
  0,              //Intel Galileo
  0,              //Tre
  unoHoles        //Ethernet
  ];

/********************************** BOARD SHAPES **********************************/
ngBoardShape = [ 
  [  0.0, 0.0 ],
  [  53.34, 0.0 ],
  [  53.34, 66.04 ],
  [  50.8, 66.04 ],
  [  48.26, 68.58 ],
  [  15.24, 68.58 ],
  [  12.7, 66.04 ],
  [  1.27, 66.04 ],
  [  0.0, 64.77 ]
  ];

megaBoardShape = [ 
  [  0.0, 0.0 ],
  [  53.34, 0.0 ],
  [  53.34, 99.06 ],
  [  52.07, 99.06 ],
  [  49.53, 101.6 ],
  [  15.24, 101.6 ],
  [  12.7, 99.06 ],
  [  2.54, 99.06 ],
  [  0.0, 96.52 ]
  ];

boardShapes = [   
  ngBoardShape,   //NG
  ngBoardShape,   //Diecimila
  ngBoardShape,   //Duemilanove
  ngBoardShape,   //Uno
  ngBoardShape,   //Leonardo
  megaBoardShape, //Mega
  megaBoardShape, //Mega 2560
  megaBoardShape, //Due
  0,              //Yun
  0,              //Intel Galileo
  0,              //Tre
  ngBoardShape    //Ethernet
  ];  

/*********************************** COMPONENTS ***********************************/

//Component data. 
//[position, dimensions, direction(which way would a cable attach), type(header, usb, etc.), color]
ngComponents = [
  [[1.27, 17.526, 0], [headerWidth, headerWidth * 10, headerHeight], [0, 0, 1], HEADER_F, "Black" ],
  [[1.27, 44.45, 0], [headerWidth, headerWidth * 8, headerHeight ], [0, 0, 1], HEADER_F, "Black" ],
  [[49.53, 26.67, 0], [headerWidth, headerWidth * 8, headerHeight ], [0, 0, 1], HEADER_F, "Black" ],
  [[49.53, 49.53, 0], [headerWidth, headerWidth * 6, headerHeight ], [0, 0, 1], HEADER_F, "Black" ],
  [[9.34, -6.5, 0],[12, 16, 11],[0, -1, 0], USB, "LightGray" ],
  [[40.7, -1.8, 0], [9.0, 13.2, 10.9], [0, -1, 0], POWER, "Black" ]
  ];

etherComponents = [
  [[1.27, 17.526, 0], [headerWidth, headerWidth * 10, headerHeight], [0, 0, 1], HEADER_F, "Black" ],
  [[1.27, 44.45, 0], [headerWidth, headerWidth * 8, headerHeight ], [0, 0, 1], HEADER_F, "Black" ],
  [[49.53, 26.67, 0], [headerWidth, headerWidth * 8, headerHeight ], [0, 0, 1], HEADER_F, "Black" ],
  [[49.53, 49.53, 0], [headerWidth, headerWidth * 6, headerHeight ], [0, 0, 1], HEADER_F, "Black" ],
  [[7.20, -4.4, 0],[16, 22, 13],[0, -1, 0], RJ45, "Green" ],
  [[40.7, -1.8, 0], [9.0, 13.2, 10.9], [0, -1, 0], POWER, "Black" ]
  ];

leonardoComponents = [
  [[1.27, 17.526, 0], [headerWidth, headerWidth * 10, headerHeight], [0, 0, 1], HEADER_F, "Black" ],
  [[1.27, 44.45, 0], [headerWidth, headerWidth * 8, headerHeight ], [0, 0, 1], HEADER_F, "Black" ],
  [[49.53, 26.67, 0], [headerWidth, headerWidth * 8, headerHeight ], [0, 0, 1], HEADER_F, "Black" ],
  [[49.53, 49.53, 0], [headerWidth, headerWidth * 6, headerHeight ], [0, 0, 1], HEADER_F, "Black" ],
  [[11.5, -1.1, 0],[7.5, 5.9, 3],[0, -1, 0], USB, "LightGray" ],
  [[40.7, -1.8, 0], [9.0, 13.2, 10.9], [0, -1, 0], POWER, "Black" ]
  ];

megaComponents = [
  [[1.27, 22.86, 0], [headerWidth, headerWidth * 8, headerHeight], [0, 0, 1], HEADER_F, "Black"],
  [[1.27, 44.45, 0], [headerWidth, headerWidth * 8, headerHeight], [0, 0, 1], HEADER_F, "Black"],
  [[1.27, 67.31, 0], [headerWidth, headerWidth * 8, headerHeight], [0, 0, 1], HEADER_F, "Black"],
  [[49.53, 31.75, 0], [headerWidth, headerWidth * 6, headerHeight ], [0, 0, 1], HEADER_F, "Black"],
  [[49.53, 49.53, 0], [headerWidth, headerWidth * 8, headerHeight], [0, 0, 1], HEADER_F, "Black"],
  [[49.53, 72.39, 0], [headerWidth, headerWidth * 8, headerHeight], [0, 0, 1], HEADER_F, "Black"],
  [[1.27, 92.71, 0], [headerWidth * 18, headerWidth * 2, headerHeight], [0, 0, 1], HEADER_F, "Black"],
  [[9.34, -6.5, 0],[12, 16, 11],[0, -1, 0], USB, "LightGray"],
  [[40.7, -1.8, 0], [9.0, 13.2, 10.9], [0, -1, 0], POWER, "Black" ]
  ];

mega2560Components = [
  [[1.27, 17.526, 0], [headerWidth, headerWidth * 10, headerHeight], [0, 0, 1], HEADER_F, "Black" ],
  [[1.27, 44.45, 0], [headerWidth, headerWidth * 8, headerHeight], [0, 0, 1], HEADER_F, "Black" ],
  [[1.27, 67.31, 0], [headerWidth, headerWidth * 8, headerHeight], [0, 0, 1], HEADER_F, "Black" ],
  [[49.53, 26.67, 0], [headerWidth, headerWidth * 8, headerHeight ], [0, 0, 1], HEADER_F, "Black" ],
  [[49.53, 49.53, 0], [headerWidth, headerWidth * 8, headerHeight], [0, 0, 1], HEADER_F, "Black" ],
  [[49.53, 72.39, 0], [headerWidth, headerWidth * 8, headerHeight], [0, 0, 1], HEADER_F, "Black" ],
  [[1.27, 92.71, 0], [headerWidth * 18, headerWidth * 2, headerHeight], [0, 0, 1], HEADER_F, "Black" ],
  [[9.34, -6.5, 0],[12, 16, 11],[0, -1, 0], USB, "LightGray" ],
  [[40.7, -1.8, 0], [9.0, 13.2, 10.9], [0, -1, 0], POWER, "Black" ]
  ];

dueComponents = [
  [[1.27, 17.526, 0], [headerWidth, headerWidth * 10, headerHeight], [0, 0, 1], HEADER_F, "Black"],
  [[1.27, 44.45, 0], [headerWidth, headerWidth * 8, headerHeight], [0, 0, 1], HEADER_F, "Black"],
  [[1.27, 67.31, 0], [headerWidth, headerWidth * 8, headerHeight], [0, 0, 1], HEADER_F, "Black"],
  [[49.53, 26.67, 0], [headerWidth, headerWidth * 8, headerHeight ], [0, 0, 1], HEADER_F, "Black"],
  [[49.53, 49.53, 0], [headerWidth, headerWidth * 8, headerHeight], [0, 0, 1], HEADER_F, "Black"],
  [[49.53, 72.39, 0], [headerWidth, headerWidth * 8, headerHeight], [0, 0, 1], HEADER_F, "Black"],
  [[1.27, 92.71, 0], [headerWidth * 18, headerWidth * 2, headerHeight], [0, 0, 1], HEADER_F, "Black"],
  [[11.5, -1.1, 0], [7.5, 5.9, 3], [0, -1, 0], USB, "LightGray" ],
  [[27.365, -1.1, 0], [7.5, 5.9, 3], [0, -1, 0], USB, "LightGray" ],
  [[40.7, -1.8, 0], [9.0, 13.2, 10.9], [0, -1, 0], POWER, "Black" ]
  ];
  
components = [
  ngComponents,         //NG
  ngComponents,         //Diecimila
  ngComponents,         //Duemilanove
  ngComponents,         //Uno
  leonardoComponents,   //Leonardo
  megaComponents,       //Mega
  mega2560Components,   //Mega 2560
  dueComponents,        //Due
  0,                    //Yun
  0,                    //Intel Galileo
  0,                    //Tre
  etherComponents       //Ethernet
  ];

/****************************** NON-BOARD PARAMETERS ******************************/

//Mounting holes
woodscrewHeadRad = 4.6228;  //Number 8 wood screw head radius
woodscrewThreadRad = 2.1336;    //Number 8 wood screw thread radius
woodscrewHeadHeight = 2.8448;  //Number 8 wood screw head height
